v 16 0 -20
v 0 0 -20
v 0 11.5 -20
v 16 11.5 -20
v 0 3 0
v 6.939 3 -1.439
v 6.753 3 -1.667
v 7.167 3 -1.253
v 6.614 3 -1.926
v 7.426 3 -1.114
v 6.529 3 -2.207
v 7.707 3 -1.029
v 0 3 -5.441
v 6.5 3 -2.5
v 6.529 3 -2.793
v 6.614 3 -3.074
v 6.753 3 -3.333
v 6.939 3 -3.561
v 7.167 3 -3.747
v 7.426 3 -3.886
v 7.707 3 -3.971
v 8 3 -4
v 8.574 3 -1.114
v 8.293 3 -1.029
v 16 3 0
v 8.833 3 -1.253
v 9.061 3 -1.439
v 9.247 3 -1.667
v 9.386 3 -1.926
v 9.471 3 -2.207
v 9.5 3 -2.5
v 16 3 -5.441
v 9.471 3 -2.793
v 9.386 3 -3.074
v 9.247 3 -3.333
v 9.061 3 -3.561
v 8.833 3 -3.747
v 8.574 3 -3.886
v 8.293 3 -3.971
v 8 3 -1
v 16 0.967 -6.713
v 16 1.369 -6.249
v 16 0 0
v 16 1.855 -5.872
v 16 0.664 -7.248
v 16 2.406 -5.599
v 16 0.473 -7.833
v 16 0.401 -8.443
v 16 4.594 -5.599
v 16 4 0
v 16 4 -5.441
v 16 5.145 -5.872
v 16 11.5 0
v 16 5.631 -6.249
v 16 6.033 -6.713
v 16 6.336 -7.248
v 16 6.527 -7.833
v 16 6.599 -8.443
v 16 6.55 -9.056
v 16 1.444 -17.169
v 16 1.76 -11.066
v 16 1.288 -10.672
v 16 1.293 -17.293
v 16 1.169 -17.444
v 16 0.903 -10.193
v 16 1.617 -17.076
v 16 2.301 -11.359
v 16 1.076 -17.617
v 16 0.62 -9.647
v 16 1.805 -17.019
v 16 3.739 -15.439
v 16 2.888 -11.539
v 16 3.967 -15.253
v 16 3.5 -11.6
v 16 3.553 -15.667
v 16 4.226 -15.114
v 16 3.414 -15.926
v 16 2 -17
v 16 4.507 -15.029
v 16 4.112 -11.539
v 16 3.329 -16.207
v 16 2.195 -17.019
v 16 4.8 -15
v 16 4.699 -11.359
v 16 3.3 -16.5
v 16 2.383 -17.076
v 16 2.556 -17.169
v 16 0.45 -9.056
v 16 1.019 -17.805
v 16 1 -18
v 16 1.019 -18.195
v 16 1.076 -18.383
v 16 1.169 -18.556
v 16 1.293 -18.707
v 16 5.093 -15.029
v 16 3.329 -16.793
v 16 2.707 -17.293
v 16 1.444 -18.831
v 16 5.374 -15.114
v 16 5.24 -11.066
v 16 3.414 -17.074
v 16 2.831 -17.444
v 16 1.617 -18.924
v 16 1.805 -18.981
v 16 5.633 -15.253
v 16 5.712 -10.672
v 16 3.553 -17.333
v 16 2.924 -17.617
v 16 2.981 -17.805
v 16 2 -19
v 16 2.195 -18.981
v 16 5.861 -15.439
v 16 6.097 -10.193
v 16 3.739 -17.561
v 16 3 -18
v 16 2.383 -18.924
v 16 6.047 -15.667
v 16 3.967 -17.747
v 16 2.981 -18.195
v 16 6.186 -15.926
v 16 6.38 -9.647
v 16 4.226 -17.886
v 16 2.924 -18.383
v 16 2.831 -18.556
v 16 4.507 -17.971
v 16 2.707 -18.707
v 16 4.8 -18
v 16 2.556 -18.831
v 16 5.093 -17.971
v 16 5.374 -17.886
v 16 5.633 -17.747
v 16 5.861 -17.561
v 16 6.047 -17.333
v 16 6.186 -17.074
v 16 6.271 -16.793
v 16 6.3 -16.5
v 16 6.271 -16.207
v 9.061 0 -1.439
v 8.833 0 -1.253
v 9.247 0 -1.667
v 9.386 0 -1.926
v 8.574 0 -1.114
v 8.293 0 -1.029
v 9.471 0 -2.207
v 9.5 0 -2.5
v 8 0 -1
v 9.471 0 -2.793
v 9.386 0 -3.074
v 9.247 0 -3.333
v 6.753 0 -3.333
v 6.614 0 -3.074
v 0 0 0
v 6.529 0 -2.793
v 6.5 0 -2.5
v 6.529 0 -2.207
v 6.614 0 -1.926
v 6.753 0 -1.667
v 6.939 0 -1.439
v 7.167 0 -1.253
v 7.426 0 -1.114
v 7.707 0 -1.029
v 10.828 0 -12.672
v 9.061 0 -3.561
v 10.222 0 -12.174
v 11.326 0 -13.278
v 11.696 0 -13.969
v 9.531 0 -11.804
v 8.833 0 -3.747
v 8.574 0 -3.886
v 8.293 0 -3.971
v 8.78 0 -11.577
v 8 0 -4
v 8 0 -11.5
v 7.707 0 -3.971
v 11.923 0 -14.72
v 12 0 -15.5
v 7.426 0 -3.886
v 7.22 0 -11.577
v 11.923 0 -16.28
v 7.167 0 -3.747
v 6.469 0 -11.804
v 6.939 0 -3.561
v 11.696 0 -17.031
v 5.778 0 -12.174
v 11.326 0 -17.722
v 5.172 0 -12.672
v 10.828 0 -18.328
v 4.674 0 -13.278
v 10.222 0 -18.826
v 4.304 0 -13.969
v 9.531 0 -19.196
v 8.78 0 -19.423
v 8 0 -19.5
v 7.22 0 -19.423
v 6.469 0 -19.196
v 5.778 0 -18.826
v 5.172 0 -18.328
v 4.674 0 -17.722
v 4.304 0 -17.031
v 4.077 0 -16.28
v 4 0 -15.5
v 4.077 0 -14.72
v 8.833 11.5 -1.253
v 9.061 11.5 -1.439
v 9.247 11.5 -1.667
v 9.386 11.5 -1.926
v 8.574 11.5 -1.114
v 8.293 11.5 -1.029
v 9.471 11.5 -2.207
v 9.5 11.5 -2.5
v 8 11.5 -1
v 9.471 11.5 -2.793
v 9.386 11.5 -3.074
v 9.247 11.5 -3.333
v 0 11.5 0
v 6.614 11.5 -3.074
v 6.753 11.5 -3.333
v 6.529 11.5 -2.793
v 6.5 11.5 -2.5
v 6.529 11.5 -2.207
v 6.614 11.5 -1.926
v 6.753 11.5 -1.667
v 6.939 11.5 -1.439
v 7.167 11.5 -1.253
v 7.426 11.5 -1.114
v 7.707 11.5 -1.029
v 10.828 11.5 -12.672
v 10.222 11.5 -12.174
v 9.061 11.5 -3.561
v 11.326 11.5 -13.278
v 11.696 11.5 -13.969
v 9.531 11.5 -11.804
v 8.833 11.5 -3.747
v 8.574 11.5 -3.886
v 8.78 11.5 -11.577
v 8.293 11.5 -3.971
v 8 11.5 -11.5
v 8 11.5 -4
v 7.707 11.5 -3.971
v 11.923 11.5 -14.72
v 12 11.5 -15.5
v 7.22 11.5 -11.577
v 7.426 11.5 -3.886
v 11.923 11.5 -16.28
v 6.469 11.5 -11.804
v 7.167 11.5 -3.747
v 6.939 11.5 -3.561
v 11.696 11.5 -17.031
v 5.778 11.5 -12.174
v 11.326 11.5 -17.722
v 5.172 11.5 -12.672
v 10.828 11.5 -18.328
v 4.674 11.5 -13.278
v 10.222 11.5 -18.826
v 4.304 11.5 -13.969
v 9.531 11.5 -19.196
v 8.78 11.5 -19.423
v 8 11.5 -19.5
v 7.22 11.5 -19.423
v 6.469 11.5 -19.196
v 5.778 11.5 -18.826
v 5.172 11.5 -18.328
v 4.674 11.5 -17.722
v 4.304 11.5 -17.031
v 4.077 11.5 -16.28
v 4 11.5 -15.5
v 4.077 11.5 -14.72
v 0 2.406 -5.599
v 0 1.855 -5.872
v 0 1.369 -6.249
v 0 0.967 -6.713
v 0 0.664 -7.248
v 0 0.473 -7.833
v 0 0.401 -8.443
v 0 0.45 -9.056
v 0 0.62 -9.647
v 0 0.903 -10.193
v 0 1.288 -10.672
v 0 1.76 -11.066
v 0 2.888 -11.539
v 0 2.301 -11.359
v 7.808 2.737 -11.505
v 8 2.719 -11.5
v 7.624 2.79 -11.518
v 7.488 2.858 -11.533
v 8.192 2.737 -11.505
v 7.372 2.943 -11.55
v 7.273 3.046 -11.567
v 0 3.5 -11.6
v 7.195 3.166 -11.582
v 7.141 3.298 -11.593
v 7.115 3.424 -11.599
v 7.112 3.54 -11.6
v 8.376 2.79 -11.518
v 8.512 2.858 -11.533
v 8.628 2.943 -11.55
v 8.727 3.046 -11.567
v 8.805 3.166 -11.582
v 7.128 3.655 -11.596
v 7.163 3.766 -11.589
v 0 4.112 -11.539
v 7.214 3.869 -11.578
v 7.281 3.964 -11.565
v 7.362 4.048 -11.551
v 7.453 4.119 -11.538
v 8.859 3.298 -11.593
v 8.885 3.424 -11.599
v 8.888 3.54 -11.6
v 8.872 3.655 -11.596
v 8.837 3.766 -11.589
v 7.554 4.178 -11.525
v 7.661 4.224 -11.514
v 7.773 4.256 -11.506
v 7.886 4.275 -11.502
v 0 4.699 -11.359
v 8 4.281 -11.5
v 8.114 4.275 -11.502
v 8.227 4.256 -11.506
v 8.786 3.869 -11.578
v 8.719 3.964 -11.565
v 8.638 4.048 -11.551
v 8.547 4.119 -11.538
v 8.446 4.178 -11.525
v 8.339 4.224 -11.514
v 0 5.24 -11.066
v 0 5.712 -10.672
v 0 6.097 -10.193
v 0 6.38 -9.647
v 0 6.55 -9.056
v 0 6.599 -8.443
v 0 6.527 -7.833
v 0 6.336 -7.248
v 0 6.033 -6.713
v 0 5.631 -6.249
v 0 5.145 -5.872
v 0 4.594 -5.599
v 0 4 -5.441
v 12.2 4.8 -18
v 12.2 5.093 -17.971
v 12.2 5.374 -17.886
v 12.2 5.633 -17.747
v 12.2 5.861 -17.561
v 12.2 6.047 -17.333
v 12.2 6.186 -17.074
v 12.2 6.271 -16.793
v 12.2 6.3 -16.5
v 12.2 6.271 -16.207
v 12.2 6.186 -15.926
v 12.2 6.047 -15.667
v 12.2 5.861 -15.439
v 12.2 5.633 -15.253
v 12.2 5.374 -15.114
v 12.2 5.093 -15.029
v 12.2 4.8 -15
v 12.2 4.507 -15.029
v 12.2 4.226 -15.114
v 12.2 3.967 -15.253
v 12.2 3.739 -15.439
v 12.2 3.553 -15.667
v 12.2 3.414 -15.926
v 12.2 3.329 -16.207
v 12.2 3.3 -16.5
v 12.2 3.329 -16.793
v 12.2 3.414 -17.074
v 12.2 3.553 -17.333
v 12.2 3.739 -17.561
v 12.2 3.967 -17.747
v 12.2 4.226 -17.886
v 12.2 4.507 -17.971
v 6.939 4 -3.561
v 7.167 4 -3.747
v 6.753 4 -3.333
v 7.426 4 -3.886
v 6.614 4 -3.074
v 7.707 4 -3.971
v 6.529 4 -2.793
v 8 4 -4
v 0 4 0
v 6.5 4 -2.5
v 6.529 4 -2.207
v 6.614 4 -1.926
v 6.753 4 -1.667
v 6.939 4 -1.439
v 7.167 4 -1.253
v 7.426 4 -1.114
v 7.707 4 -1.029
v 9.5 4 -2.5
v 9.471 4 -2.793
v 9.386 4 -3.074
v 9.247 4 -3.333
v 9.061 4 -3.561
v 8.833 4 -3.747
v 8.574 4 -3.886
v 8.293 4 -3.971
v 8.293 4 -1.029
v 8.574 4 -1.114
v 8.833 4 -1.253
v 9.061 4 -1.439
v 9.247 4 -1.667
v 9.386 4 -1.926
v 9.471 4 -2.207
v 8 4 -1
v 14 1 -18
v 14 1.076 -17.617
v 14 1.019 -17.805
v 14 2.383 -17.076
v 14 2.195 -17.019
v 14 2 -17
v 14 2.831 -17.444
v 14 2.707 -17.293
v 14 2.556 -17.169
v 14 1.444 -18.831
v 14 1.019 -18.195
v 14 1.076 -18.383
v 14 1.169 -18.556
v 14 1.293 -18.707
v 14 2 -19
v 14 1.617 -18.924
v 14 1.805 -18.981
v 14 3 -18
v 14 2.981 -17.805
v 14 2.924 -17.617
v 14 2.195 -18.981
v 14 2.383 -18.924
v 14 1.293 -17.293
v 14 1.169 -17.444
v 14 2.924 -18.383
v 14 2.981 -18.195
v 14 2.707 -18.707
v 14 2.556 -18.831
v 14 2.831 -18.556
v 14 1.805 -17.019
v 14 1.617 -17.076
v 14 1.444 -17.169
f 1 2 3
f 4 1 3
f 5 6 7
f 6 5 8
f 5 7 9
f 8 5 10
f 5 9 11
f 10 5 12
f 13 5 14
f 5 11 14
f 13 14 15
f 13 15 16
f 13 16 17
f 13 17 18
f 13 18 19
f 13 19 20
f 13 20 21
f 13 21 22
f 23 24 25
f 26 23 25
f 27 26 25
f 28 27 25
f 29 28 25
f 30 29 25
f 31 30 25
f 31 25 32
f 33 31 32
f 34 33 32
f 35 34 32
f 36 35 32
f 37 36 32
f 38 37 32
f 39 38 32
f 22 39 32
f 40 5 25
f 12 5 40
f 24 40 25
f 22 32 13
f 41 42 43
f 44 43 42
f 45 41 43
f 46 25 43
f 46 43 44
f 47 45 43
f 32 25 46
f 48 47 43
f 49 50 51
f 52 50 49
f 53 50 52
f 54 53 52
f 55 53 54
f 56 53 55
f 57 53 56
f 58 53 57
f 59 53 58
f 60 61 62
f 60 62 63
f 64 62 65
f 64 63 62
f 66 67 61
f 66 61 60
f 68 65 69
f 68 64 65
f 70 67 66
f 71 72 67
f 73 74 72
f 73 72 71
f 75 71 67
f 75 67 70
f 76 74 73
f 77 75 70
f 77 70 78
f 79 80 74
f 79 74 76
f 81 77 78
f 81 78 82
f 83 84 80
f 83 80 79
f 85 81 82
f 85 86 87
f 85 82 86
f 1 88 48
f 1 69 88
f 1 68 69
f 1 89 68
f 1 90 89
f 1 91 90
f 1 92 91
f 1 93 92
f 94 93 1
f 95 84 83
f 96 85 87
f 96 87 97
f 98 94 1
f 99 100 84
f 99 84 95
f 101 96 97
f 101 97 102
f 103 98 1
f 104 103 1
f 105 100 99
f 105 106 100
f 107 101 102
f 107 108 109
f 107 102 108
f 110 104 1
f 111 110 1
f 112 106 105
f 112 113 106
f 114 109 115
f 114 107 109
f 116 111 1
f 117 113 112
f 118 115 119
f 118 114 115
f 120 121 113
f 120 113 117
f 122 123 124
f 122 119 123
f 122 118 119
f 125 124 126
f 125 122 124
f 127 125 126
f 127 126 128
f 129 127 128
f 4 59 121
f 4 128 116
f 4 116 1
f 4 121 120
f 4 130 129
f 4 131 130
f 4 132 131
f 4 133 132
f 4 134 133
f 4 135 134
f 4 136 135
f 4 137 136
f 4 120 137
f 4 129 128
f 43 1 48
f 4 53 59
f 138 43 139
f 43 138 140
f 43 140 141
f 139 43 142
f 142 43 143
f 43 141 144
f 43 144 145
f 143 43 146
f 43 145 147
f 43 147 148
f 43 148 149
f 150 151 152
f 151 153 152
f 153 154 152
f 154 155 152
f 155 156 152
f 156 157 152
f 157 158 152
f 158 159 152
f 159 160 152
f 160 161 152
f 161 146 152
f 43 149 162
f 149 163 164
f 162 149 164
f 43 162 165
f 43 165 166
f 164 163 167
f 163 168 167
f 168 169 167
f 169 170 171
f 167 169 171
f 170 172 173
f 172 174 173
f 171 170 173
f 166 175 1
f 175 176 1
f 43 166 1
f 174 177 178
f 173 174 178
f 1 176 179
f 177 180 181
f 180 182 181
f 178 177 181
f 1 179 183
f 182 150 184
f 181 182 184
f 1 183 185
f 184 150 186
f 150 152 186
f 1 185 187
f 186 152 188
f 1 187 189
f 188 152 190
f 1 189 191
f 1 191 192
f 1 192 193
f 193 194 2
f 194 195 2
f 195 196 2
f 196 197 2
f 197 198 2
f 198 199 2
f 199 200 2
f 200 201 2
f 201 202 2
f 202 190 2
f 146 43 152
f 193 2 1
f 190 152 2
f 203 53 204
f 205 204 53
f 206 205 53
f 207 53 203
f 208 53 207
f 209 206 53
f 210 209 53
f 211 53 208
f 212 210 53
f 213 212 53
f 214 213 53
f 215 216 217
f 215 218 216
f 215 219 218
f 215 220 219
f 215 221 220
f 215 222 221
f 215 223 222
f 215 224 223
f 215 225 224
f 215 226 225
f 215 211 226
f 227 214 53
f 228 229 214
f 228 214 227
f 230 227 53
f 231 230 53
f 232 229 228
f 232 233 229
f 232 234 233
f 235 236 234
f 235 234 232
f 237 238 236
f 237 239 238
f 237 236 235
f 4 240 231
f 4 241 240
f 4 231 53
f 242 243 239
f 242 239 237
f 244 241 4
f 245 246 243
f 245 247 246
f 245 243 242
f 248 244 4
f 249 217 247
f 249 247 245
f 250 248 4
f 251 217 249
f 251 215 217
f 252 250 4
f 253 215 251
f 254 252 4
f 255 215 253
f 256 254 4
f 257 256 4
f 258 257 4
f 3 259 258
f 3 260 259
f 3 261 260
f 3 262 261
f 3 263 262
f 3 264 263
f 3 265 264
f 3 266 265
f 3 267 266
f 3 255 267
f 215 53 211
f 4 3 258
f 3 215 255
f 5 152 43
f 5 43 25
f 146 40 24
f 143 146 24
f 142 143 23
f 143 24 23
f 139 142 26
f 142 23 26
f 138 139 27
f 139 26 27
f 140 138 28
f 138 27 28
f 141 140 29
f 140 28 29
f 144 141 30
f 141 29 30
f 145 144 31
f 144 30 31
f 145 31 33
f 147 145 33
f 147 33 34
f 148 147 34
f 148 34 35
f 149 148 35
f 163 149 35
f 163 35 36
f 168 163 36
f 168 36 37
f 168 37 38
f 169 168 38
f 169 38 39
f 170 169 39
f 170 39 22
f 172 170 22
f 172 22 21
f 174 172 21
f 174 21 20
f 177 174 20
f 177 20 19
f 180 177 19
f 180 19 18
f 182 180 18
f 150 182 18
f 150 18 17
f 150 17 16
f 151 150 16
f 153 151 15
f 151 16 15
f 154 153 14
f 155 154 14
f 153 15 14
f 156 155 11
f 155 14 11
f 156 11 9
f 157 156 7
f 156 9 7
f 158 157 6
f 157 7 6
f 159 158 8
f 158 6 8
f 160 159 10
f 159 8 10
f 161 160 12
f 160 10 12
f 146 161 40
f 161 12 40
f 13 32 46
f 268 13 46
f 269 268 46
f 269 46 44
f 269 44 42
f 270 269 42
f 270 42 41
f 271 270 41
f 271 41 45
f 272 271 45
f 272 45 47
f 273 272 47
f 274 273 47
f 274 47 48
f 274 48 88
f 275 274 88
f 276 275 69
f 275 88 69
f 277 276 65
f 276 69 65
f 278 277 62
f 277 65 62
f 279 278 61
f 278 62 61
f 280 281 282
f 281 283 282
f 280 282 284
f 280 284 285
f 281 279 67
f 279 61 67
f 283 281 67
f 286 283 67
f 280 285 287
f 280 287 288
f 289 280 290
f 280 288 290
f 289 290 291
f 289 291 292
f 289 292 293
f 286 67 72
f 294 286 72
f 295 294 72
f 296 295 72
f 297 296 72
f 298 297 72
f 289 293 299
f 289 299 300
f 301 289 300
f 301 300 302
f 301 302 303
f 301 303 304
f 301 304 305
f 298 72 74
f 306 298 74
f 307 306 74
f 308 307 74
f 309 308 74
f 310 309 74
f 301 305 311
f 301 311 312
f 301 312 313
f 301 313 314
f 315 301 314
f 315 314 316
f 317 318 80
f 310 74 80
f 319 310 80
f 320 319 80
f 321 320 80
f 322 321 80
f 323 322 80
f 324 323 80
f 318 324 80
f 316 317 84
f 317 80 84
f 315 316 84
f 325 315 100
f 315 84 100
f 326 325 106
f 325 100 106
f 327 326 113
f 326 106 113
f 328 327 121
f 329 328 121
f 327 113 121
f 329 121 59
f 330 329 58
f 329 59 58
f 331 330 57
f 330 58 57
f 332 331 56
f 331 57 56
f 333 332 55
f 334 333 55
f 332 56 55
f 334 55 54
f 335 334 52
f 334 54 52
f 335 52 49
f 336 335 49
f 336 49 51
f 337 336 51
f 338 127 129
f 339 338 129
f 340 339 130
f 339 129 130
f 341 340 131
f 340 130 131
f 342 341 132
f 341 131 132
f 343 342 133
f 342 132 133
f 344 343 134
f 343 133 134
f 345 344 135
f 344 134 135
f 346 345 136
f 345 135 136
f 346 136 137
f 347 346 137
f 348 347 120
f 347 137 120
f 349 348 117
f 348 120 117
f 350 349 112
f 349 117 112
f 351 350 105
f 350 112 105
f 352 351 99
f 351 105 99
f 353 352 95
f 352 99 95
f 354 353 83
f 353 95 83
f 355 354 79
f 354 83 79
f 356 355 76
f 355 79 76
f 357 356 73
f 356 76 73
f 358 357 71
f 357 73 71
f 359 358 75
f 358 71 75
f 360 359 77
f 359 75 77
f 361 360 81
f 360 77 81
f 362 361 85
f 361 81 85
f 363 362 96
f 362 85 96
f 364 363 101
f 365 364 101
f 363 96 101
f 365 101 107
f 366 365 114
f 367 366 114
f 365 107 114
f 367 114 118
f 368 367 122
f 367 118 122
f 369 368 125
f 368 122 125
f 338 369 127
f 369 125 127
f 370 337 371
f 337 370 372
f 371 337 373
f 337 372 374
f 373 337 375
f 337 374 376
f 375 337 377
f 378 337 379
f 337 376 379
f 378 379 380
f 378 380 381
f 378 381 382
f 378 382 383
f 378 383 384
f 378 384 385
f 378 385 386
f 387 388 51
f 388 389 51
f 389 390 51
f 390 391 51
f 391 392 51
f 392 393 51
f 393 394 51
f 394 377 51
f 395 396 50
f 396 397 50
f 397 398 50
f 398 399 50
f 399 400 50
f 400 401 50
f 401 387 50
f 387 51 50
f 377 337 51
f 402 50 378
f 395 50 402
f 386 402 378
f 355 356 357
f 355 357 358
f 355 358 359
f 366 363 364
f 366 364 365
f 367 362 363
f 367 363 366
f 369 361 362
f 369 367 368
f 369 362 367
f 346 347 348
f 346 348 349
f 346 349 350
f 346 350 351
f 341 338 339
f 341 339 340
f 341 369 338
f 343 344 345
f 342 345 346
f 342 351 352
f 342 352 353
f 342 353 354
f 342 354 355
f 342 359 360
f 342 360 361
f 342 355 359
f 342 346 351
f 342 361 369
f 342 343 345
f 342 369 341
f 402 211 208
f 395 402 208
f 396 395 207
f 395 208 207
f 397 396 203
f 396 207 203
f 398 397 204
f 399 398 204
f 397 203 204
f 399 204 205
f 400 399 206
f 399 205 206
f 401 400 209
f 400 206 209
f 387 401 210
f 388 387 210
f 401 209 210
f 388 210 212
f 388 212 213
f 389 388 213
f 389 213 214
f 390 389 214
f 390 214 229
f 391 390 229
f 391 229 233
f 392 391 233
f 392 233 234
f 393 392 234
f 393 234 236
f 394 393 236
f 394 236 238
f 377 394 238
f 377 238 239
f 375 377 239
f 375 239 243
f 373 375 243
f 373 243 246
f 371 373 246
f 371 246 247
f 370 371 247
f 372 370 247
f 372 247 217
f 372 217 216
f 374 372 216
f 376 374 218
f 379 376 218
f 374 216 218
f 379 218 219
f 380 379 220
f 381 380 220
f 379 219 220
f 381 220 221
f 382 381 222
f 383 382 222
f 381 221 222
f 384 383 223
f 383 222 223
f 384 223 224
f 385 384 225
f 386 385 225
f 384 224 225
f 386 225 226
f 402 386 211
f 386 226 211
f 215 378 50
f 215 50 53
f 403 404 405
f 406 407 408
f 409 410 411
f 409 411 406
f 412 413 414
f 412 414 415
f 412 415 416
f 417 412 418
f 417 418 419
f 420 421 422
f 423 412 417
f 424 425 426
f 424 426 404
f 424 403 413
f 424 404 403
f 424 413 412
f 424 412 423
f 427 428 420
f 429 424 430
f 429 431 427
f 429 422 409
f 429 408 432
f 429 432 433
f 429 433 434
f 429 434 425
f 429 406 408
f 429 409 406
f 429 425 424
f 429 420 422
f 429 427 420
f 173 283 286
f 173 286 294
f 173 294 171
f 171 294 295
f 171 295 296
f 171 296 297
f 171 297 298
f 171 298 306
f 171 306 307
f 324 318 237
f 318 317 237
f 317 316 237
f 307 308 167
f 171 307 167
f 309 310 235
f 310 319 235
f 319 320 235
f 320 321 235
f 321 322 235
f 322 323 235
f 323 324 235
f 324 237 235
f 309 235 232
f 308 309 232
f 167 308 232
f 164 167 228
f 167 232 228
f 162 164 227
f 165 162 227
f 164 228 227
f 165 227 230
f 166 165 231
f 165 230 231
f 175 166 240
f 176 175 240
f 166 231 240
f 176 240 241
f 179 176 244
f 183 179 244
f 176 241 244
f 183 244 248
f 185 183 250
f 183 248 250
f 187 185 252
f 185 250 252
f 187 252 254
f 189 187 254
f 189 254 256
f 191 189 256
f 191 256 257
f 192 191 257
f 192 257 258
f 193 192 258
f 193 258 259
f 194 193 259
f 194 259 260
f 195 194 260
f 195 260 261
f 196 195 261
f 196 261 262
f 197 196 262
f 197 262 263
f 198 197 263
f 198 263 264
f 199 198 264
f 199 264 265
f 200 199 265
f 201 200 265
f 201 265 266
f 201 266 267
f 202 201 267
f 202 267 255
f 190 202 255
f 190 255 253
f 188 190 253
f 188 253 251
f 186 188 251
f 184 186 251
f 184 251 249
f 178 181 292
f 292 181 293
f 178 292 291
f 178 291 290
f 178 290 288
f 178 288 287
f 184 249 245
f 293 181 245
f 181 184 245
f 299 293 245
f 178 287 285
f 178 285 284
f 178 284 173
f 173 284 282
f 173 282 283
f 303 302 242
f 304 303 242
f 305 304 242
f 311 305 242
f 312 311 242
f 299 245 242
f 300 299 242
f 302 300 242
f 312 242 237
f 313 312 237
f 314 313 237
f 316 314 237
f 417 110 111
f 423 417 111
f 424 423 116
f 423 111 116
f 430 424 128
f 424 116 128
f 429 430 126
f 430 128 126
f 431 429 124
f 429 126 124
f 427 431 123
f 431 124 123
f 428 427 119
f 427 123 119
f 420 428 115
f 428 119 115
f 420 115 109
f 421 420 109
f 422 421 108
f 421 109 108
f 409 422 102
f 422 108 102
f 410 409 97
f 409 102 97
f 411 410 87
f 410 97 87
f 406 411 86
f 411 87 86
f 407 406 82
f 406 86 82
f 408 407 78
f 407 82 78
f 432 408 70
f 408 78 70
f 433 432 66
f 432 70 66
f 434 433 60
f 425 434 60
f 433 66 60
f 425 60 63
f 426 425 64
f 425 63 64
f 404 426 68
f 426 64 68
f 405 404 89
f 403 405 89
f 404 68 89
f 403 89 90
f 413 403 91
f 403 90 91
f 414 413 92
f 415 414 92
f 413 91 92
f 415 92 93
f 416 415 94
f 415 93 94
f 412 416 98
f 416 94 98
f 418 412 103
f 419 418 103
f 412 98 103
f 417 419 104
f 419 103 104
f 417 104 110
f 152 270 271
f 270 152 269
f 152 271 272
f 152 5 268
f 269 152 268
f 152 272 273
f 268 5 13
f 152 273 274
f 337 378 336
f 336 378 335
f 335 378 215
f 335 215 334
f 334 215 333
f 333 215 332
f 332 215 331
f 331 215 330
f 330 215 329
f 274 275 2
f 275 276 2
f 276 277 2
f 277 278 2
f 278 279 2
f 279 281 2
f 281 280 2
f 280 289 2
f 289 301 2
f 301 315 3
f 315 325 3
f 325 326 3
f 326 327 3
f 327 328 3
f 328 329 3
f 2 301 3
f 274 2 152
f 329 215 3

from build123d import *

# Parameters (mm, degrees)
SKETCH_1_W          = 20
SKETCH_1_H          = 11.5
EXTRUDE_1_DEPTH     = 16
SKETCH_2_R          = 1.5
SKETCH_2_R_2        = 4
CUT_EXTRUDE_1_DEPTH = 29.075790283
SKETCH_6_R          = 1
CUT_EXTRUDE_2_DEPTH = 2
SKETCH_6_3_R        = 1.5
CUT_EXTRUDE_3_DEPTH = 3.8
CUT_EXTRUDE_4_DEPTH = 29.075790283


with BuildPart() as part:
    # 스케치1 → 보스-돌출1 (new body)
    with BuildSketch(Plane(origin=(0, 0, 0), x_dir=(0, 0, -1), z_dir=(1, 0, 0))):
        with Locations((10, 5.75)):
            Rectangle(SKETCH_1_W, SKETCH_1_H)
    extrude(amount=EXTRUDE_1_DEPTH)

    # 스케치2 → 컷-돌출1 (cut, through all)
    with BuildSketch(Plane(origin=(0, 11.5, 0), x_dir=(1, 0, 0), z_dir=(0, 1, 0))):
        with Locations((8, 2.5)):
            Circle(SKETCH_2_R)
        with Locations((8, 15.5)):
            Circle(SKETCH_2_R_2)
    extrude(amount=-CUT_EXTRUDE_1_DEPTH, mode=Mode.SUBTRACT)

    # 스케치6 → 컷-돌출2 (cut)
    with BuildSketch(Plane(origin=(16, 0, 0), x_dir=(0, 0, -1), z_dir=(1, 0, 0))):
        with Locations((18, 2)):
            Circle(SKETCH_6_R)
    extrude(amount=-CUT_EXTRUDE_2_DEPTH, mode=Mode.SUBTRACT)

    # 스케치6<3> → 컷-돌출3 (cut)
    with BuildSketch(Plane(origin=(16, 0, 0), x_dir=(0, 0, -1), z_dir=(1, 0, 0))):
        with Locations((16.5, 4.8)):
            Circle(SKETCH_6_3_R)
    extrude(amount=-CUT_EXTRUDE_3_DEPTH, mode=Mode.SUBTRACT)

    # 스케치6<4> → 컷-돌출4 (cut, through all)
    with BuildSketch(Plane(origin=(16, 0, 0), x_dir=(0, 0, -1), z_dir=(1, 0, 0))):
        with BuildLine():
            Line((5.440588292, 4), (0, 4))
            Line((0, 4), (0, 3))
            Line((0, 3), (5.440588292, 3))
            ThreePointArc((5.440588292, 3), (11.6, 3.5), (5.440588292, 4))
        make_face()
    extrude(amount=-CUT_EXTRUDE_4_DEPTH, mode=Mode.SUBTRACT)


solid = part.part
